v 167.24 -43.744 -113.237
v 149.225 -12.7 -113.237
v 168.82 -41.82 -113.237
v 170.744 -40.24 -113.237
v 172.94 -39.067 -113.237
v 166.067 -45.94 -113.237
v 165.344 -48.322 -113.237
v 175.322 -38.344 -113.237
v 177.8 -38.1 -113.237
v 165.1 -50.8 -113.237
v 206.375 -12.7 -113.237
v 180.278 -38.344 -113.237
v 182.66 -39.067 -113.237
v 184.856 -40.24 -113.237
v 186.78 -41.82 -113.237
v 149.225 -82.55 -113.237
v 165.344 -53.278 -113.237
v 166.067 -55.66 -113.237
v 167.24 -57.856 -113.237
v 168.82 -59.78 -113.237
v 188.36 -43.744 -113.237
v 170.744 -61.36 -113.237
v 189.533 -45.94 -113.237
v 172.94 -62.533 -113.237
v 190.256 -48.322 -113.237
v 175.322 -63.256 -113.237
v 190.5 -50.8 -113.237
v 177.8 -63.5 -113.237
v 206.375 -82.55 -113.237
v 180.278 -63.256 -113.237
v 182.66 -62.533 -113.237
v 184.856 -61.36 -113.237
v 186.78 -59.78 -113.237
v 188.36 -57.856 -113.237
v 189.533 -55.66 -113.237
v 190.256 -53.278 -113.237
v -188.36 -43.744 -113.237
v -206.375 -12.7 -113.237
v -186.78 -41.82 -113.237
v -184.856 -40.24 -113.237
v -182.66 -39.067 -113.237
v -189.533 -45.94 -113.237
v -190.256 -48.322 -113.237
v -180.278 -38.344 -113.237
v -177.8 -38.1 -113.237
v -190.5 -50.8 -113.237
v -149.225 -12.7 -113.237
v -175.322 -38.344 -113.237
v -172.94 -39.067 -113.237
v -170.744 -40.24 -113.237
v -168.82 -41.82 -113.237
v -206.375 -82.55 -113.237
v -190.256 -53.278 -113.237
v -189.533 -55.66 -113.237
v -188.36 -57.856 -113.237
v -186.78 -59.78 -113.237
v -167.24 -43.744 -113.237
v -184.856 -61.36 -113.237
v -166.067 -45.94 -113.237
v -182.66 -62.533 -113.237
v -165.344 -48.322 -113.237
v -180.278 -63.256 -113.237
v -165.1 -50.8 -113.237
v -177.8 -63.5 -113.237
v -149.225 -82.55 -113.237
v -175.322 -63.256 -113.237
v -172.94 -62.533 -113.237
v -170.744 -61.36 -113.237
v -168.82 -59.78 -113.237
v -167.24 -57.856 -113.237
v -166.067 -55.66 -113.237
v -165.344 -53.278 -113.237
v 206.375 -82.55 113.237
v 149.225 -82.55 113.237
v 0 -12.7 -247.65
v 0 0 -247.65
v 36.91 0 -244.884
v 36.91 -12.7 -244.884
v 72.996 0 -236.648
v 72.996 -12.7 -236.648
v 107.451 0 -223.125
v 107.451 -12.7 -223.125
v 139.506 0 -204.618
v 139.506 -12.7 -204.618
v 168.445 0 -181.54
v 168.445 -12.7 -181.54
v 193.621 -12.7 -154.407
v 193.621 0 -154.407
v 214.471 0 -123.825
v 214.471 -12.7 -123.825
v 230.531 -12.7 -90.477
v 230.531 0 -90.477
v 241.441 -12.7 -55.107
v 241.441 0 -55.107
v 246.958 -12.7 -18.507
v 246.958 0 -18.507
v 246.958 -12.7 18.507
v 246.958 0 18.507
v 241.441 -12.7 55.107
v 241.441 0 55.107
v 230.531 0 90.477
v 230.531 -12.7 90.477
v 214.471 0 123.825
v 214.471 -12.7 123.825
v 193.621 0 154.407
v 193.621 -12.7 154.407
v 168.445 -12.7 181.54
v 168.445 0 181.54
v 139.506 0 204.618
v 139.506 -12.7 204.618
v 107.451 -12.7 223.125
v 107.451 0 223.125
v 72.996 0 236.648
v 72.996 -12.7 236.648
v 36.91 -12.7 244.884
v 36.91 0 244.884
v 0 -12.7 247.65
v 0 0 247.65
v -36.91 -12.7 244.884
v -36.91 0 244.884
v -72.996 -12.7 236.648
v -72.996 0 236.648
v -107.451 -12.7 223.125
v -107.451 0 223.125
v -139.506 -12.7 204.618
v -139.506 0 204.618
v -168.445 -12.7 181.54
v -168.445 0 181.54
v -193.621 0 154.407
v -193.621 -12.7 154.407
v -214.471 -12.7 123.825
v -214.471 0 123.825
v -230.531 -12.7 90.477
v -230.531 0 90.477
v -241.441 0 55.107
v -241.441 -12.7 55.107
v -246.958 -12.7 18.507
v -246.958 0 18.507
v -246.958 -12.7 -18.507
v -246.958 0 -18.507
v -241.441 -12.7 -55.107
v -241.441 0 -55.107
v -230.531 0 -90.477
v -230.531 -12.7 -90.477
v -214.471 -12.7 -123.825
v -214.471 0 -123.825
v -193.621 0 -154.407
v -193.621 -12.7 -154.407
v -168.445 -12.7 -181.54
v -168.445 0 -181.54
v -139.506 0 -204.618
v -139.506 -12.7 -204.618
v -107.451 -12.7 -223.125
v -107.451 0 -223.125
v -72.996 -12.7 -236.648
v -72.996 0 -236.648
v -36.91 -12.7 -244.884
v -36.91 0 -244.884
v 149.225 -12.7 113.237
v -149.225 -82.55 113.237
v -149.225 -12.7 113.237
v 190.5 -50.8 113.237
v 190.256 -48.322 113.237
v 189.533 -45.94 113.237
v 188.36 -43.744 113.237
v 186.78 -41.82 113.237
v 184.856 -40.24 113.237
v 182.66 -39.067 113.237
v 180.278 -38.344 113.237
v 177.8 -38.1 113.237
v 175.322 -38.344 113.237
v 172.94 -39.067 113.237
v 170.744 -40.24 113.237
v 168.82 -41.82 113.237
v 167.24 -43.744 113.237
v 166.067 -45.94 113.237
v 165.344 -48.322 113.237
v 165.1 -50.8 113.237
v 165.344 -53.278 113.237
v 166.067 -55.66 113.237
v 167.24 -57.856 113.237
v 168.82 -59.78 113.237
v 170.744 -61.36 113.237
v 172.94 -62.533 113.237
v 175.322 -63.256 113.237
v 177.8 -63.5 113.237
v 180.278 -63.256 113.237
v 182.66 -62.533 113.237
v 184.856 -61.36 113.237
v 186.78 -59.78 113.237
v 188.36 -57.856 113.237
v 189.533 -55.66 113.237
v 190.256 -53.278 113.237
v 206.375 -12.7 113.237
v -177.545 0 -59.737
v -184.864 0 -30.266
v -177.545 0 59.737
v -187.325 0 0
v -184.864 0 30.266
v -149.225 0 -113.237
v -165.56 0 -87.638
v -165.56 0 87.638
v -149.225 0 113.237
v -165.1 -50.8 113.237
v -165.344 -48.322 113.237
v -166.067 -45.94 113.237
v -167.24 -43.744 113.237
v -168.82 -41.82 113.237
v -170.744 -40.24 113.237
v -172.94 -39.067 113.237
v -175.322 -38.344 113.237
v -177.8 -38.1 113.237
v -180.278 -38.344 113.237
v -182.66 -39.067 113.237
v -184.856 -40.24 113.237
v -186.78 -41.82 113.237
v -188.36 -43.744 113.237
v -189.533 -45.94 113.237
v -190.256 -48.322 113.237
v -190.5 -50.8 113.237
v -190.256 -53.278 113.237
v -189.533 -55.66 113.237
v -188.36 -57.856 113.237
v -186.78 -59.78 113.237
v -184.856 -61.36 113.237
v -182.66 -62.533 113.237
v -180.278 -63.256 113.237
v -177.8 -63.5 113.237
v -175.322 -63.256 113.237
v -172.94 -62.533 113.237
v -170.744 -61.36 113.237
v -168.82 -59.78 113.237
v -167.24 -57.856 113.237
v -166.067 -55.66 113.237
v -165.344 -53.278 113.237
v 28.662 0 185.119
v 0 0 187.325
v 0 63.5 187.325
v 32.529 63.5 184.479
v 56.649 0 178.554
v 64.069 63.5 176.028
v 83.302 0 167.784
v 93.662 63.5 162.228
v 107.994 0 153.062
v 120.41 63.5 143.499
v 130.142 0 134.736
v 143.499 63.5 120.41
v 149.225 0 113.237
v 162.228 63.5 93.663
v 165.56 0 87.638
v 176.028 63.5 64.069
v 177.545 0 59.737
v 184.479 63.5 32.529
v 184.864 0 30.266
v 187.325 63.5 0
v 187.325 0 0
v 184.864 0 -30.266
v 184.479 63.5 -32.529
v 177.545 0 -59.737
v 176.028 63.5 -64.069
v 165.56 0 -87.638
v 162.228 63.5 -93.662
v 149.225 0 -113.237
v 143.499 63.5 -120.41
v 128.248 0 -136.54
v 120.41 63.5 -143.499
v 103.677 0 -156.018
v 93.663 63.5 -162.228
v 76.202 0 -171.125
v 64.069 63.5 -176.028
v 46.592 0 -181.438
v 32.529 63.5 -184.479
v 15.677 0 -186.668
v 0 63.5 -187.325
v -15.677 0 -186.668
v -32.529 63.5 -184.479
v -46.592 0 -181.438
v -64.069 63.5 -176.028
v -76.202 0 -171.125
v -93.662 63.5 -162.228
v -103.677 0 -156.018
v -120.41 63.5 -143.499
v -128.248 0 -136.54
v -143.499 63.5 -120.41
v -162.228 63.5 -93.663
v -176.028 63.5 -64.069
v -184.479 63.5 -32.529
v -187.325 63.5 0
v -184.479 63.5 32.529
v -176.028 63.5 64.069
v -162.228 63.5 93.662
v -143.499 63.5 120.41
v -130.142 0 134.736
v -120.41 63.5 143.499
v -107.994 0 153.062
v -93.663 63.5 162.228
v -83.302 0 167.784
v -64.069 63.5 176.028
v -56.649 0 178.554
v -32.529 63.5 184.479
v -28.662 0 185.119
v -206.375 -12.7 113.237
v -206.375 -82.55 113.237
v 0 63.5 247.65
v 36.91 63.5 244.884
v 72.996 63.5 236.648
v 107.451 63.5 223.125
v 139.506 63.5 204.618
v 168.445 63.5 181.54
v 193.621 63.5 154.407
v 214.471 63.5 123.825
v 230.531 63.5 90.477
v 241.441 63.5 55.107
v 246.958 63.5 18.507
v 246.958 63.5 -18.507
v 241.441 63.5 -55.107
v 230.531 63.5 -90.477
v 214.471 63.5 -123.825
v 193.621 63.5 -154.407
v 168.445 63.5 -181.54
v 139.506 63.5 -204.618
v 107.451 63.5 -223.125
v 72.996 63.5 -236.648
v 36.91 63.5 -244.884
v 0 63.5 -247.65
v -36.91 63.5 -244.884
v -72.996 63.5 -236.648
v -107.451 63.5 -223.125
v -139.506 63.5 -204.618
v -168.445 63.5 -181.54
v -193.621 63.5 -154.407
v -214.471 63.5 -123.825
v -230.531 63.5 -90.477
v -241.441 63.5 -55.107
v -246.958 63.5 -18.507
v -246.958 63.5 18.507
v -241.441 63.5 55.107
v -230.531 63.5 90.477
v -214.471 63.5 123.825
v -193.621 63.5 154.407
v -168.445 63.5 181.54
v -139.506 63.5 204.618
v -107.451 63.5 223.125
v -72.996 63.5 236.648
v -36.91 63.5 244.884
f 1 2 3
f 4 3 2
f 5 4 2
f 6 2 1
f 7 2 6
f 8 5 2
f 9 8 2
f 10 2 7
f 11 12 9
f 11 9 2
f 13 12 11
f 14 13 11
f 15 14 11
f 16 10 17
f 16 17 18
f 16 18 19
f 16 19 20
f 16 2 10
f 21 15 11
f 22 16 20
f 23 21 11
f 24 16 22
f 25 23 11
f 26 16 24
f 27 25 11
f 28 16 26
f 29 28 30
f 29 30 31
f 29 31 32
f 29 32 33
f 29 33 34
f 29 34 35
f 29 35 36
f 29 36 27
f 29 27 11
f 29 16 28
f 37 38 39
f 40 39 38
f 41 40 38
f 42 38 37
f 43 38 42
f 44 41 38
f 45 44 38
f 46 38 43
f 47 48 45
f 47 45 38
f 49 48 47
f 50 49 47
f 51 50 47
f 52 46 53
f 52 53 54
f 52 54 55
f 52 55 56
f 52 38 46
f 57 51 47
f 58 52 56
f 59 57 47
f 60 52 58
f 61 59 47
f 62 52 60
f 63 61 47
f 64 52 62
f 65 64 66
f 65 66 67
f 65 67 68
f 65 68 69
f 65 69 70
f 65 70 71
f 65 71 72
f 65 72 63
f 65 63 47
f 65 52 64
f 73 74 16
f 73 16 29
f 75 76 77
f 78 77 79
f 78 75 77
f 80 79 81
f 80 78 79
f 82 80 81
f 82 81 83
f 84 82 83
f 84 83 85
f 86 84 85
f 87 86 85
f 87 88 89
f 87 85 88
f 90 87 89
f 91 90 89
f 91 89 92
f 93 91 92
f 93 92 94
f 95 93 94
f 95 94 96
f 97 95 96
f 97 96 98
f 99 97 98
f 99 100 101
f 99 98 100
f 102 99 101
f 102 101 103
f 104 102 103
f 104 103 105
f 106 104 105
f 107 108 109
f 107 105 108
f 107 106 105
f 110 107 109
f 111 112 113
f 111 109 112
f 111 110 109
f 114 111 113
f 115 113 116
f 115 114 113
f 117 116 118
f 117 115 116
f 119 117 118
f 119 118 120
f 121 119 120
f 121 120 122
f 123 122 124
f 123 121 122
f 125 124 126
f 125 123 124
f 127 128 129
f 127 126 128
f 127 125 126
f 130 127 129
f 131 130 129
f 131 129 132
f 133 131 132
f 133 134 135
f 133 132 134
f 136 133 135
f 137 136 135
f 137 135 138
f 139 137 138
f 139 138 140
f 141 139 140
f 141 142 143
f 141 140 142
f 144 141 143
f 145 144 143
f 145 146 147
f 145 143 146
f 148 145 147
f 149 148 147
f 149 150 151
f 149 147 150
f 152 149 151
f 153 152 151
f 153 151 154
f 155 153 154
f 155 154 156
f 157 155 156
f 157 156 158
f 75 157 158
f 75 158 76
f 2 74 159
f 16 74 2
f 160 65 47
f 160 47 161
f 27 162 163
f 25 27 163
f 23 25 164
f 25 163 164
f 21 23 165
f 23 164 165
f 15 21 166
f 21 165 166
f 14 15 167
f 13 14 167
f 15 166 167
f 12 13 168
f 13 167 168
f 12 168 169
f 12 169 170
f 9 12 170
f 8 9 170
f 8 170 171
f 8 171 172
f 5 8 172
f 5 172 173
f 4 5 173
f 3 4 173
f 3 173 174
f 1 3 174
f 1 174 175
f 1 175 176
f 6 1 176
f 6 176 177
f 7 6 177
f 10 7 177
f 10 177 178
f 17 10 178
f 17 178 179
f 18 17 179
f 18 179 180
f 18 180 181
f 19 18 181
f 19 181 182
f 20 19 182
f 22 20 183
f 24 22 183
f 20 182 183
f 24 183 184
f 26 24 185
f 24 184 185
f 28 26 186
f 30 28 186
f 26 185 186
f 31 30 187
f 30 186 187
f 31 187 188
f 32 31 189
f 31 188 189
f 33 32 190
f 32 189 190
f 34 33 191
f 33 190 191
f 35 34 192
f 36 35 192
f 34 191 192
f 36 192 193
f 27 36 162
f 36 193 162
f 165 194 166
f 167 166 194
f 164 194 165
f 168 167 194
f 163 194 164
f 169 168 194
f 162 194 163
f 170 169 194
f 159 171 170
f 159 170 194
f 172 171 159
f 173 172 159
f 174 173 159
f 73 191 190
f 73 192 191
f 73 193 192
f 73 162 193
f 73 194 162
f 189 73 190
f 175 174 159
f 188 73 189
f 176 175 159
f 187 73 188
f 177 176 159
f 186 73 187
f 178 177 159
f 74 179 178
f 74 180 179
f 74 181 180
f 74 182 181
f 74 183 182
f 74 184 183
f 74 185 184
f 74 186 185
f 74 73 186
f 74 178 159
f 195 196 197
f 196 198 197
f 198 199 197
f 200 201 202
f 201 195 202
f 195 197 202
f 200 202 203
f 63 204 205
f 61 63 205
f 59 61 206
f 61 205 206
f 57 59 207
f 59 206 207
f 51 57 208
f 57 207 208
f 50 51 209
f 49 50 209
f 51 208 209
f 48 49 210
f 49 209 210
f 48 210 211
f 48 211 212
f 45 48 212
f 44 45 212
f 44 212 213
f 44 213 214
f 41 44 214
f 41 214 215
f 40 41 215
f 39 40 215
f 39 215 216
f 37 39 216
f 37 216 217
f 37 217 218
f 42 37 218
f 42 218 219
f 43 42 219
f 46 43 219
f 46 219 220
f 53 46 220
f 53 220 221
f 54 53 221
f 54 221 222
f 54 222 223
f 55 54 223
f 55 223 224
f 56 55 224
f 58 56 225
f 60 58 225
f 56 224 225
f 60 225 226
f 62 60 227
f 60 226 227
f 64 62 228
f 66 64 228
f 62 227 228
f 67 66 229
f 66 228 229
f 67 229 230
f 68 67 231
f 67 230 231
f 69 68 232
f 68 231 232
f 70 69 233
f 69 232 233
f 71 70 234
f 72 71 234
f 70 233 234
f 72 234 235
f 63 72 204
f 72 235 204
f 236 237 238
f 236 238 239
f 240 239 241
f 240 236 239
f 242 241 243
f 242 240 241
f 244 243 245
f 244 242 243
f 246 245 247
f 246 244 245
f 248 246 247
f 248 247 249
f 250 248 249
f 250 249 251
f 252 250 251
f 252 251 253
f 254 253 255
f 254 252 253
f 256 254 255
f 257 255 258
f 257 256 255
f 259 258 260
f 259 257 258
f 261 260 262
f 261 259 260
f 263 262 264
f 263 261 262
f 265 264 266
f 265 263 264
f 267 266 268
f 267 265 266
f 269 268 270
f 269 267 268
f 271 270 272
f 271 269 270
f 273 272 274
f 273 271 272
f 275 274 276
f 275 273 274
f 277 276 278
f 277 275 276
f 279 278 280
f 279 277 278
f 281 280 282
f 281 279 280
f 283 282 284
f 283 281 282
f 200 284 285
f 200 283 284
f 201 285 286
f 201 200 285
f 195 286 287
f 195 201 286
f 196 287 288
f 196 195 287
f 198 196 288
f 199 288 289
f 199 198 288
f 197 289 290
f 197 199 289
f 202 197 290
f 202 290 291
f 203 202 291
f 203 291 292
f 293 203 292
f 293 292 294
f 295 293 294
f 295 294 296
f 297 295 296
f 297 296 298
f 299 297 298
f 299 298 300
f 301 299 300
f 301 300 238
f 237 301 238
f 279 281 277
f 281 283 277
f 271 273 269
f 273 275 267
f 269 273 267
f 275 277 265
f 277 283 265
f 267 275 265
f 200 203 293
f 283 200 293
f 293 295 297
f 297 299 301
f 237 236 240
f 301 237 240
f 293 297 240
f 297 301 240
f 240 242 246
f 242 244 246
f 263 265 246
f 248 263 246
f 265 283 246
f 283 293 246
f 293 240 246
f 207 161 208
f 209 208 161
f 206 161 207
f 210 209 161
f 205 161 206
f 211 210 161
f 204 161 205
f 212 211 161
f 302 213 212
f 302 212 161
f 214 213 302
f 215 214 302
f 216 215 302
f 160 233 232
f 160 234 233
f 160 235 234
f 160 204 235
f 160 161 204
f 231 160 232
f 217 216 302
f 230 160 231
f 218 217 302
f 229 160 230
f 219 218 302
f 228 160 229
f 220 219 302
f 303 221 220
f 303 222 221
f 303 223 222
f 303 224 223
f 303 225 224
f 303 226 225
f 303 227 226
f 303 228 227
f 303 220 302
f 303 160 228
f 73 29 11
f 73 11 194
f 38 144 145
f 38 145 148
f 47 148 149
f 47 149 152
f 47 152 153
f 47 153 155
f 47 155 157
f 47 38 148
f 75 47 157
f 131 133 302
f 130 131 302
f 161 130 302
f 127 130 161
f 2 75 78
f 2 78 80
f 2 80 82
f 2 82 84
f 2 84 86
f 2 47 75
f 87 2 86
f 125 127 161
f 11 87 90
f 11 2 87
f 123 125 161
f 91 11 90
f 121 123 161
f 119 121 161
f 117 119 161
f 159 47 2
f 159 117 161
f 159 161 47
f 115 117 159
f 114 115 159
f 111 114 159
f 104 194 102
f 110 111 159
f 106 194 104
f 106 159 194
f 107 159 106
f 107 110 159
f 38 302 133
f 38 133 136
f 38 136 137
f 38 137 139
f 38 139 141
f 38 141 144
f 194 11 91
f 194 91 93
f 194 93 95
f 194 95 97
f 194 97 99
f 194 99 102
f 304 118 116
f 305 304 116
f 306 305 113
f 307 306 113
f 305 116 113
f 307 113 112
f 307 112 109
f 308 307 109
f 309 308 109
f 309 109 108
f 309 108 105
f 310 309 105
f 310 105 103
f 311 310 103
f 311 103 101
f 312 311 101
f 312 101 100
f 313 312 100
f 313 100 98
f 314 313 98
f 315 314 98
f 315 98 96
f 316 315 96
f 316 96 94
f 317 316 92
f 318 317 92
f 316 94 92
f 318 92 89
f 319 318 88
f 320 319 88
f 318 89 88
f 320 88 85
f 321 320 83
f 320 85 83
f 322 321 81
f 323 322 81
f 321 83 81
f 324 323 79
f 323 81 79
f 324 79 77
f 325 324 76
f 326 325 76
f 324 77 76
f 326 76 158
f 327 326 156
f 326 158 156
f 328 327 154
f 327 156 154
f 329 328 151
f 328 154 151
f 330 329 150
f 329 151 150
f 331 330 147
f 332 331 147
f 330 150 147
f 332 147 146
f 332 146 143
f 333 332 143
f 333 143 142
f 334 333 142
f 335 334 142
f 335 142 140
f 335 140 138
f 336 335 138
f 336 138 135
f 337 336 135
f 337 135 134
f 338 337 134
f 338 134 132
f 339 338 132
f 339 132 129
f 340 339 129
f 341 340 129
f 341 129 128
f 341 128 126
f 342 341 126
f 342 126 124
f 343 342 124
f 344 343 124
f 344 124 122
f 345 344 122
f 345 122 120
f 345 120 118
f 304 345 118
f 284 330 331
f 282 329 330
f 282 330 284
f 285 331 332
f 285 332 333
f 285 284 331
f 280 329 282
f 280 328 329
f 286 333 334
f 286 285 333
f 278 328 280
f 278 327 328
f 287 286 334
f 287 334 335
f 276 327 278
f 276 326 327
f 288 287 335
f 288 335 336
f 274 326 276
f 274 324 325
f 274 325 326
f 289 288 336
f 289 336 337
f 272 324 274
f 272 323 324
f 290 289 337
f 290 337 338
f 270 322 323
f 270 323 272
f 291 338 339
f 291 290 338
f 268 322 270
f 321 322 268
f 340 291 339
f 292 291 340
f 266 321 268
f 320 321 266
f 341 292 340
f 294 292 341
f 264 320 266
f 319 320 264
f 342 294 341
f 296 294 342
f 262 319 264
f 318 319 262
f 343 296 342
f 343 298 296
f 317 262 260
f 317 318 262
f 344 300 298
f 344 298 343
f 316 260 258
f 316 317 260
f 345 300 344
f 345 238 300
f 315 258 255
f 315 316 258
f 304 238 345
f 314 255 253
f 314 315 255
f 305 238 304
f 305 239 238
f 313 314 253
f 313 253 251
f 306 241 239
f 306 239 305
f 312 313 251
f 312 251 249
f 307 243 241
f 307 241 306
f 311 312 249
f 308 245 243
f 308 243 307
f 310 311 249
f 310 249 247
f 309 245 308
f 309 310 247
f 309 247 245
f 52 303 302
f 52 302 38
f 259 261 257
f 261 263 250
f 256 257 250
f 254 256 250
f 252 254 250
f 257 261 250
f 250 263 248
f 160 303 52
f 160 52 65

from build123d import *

# Parameters (mm, degrees)
SKETCH1_R           = 247.65
SKETCH1_R_2         = 187.325
BOSS_EXTRUDE1_DEPTH = 63.5
BOSS_EXTRUDE2_START = 12.7
SKETCH2_R           = 247.65
BOSS_EXTRUDE2_DEPTH = 12.7
BOSS_EXTRUDE3_START = 82.55
BOSS_EXTRUDE3_DEPTH = 69.85
CUT_EXTRUDE1_REACH  = 447.403
SKETCH4_R           = 12.7


with BuildPart() as part:
    # Sketch1 → Boss-Extrude1 (new body)
    with BuildSketch(Plane(origin=(0, 0, 0), x_dir=(1, 0, 0), z_dir=(0, 1, 0))):
        with Locations(Location((0, 0, 0), (0, 0, 270))):
            Circle(SKETCH1_R)
        with Locations(Location((0, 0, 0), (0, 0, 270))):
            Circle(SKETCH1_R_2, mode=Mode.SUBTRACT)
    extrude(amount=BOSS_EXTRUDE1_DEPTH)

    # Sketch2 → Boss-Extrude2 (add)
    # profile 1 of 6: a face of its own
    with BuildSketch(Plane.XZ.offset(BOSS_EXTRUDE2_START)):
        with Locations(Location((0, 0, 0), (0, 0, 270))):
            Circle(SKETCH2_R)
        with BuildLine():
            Line((-206.375, -113.236721076), (-206.375, 113.236721076))
            Line((-206.375, 113.236721076), (-149.225, 113.236721076))
            ThreePointArc((-149.225, 113.236721076), (0, 187.325), (149.225, 113.236721076))
            Line((149.225, 113.236721076), (206.375, 113.236721076))
            Line((206.375, 113.236721076), (206.375, -113.236721076))
            Line((206.375, -113.236721076), (149.225, -113.236721076))
            ThreePointArc((149.225, -113.236721076), (0, -187.325), (-149.225, -113.236721076))
            Line((-149.225, -113.236721076), (-206.375, -113.236721076))
        make_face(mode=Mode.SUBTRACT)
    # profile 2 of 6: a face of its own
    with BuildSketch(Plane.XZ.offset(BOSS_EXTRUDE2_START)):
        with BuildLine():
            Line((206.375, 113.236721076), (149.225, 113.236721076))
            ThreePointArc((149.225, 113.236721076), (177.544682756, 59.737268518), (187.325, 0))
            ThreePointArc((187.325, 0), (177.544682756, -59.737268518), (149.225, -113.236721076))
            Line((149.225, -113.236721076), (206.375, -113.236721076))
            Line((206.375, -113.236721076), (206.375, 113.236721076))
        make_face()
    # profile 3 of 6: a face of its own
    with BuildSketch(Plane.XZ.offset(BOSS_EXTRUDE2_START)):
        with BuildLine():
            ThreePointArc((187.325, 0), (177.544682756, 59.737268518), (149.225, 113.236721076))
            Line((149.225, 113.236721076), (149.225, -113.236721076))
            ThreePointArc((149.225, -113.236721076), (177.544682756, -59.737268518), (187.325, 0))
        make_face()
    # profile 4 of 6: a face of its own
    with BuildSketch(Plane.XZ.offset(BOSS_EXTRUDE2_START)):
        with BuildLine():
            Line((-149.225, -113.236721076), (-149.225, 113.236721076))
            ThreePointArc((-149.225, 113.236721076), (-187.325, 0), (-149.225, -113.236721076))
        make_face()
    # profile 5 of 6: a face of its own
    with BuildSketch(Plane.XZ.offset(BOSS_EXTRUDE2_START)):
        with BuildLine():
            ThreePointArc((149.225, 113.236721076), (0, 187.325), (-149.225, 113.236721076))
            Line((-149.225, 113.236721076), (-149.225, -113.236721076))
            ThreePointArc((-149.225, -113.236721076), (0, -187.325), (149.225, -113.236721076))
            Line((149.225, -113.236721076), (149.225, 113.236721076))
        make_face()
    # profile 6 of 6: a face of its own
    with BuildSketch(Plane.XZ.offset(BOSS_EXTRUDE2_START)):
        with BuildLine():
            Line((-149.225, 113.236721076), (-206.375, 113.236721076))
            Line((-206.375, 113.236721076), (-206.375, -113.236721076))
            Line((-206.375, -113.236721076), (-149.225, -113.236721076))
            ThreePointArc((-149.225, -113.236721076), (-187.325, 0), (-149.225, 113.236721076))
        make_face()
    extrude(amount=-BOSS_EXTRUDE2_DEPTH)

    # Sketch2<3> → Boss-Extrude3 (add)
    with BuildSketch(Plane.XZ.offset(BOSS_EXTRUDE3_START)):
        with BuildLine():
            Line((-149.225, -113.236721076), (-149.225, 113.236721076))
            ThreePointArc((-149.225, 113.236721076), (-187.325, 0), (-149.225, -113.236721076))
        make_face()
        with BuildLine():
            Line((-149.225, 113.236721076), (-206.375, 113.236721076))
            Line((-206.375, 113.236721076), (-206.375, -113.236721076))
            Line((-206.375, -113.236721076), (-149.225, -113.236721076))
            ThreePointArc((-149.225, -113.236721076), (-187.325, 0), (-149.225, 113.236721076))
        make_face()
        with BuildLine():
            Line((206.375, 113.236721076), (149.225, 113.236721076))
            ThreePointArc((149.225, 113.236721076), (177.544682756, 59.737268518), (187.325, 0))
            ThreePointArc((187.325, 0), (177.544682756, -59.737268518), (149.225, -113.236721076))
            Line((149.225, -113.236721076), (206.375, -113.236721076))
            Line((206.375, -113.236721076), (206.375, 113.236721076))
        make_face()
        with BuildLine():
            ThreePointArc((187.325, 0), (177.544682756, 59.737268518), (149.225, 113.236721076))
            Line((149.225, 113.236721076), (149.225, -113.236721076))
            ThreePointArc((149.225, -113.236721076), (177.544682756, -59.737268518), (187.325, 0))
        make_face()
    extrude(amount=-BOSS_EXTRUDE3_DEPTH)

    # Sketch4 → Cut-Extrude1 (cut, up to next)
    with BuildSketch(Plane.XY.offset(113.236721076), mode=Mode.PRIVATE) as cut_extrude1_sk1:
        with Locations((177.8, -50.8)):
            Circle(SKETCH4_R)
    cut_extrude1_tool1 = extrude(cut_extrude1_sk1.sketch, amount=-CUT_EXTRUDE1_REACH, mode=Mode.PRIVATE) & part.part
    # Sketch4 → Cut-Extrude1 (cut, up to next)
    with BuildSketch(Plane.XY.offset(113.236721076), mode=Mode.PRIVATE) as cut_extrude1_sk2:
        with Locations((-177.8, -50.8)):
            Circle(SKETCH4_R)
    cut_extrude1_tool2 = extrude(cut_extrude1_sk2.sketch, amount=-CUT_EXTRUDE1_REACH, mode=Mode.PRIVATE) & part.part
    add(cut_extrude1_tool1.solids().sort_by_distance((177.8, -50.8, 113.236721))[0], mode=Mode.SUBTRACT)
    add(cut_extrude1_tool2.solids().sort_by_distance((-177.8, -50.8, 113.236721))[0], mode=Mode.SUBTRACT)


solid = part.part
